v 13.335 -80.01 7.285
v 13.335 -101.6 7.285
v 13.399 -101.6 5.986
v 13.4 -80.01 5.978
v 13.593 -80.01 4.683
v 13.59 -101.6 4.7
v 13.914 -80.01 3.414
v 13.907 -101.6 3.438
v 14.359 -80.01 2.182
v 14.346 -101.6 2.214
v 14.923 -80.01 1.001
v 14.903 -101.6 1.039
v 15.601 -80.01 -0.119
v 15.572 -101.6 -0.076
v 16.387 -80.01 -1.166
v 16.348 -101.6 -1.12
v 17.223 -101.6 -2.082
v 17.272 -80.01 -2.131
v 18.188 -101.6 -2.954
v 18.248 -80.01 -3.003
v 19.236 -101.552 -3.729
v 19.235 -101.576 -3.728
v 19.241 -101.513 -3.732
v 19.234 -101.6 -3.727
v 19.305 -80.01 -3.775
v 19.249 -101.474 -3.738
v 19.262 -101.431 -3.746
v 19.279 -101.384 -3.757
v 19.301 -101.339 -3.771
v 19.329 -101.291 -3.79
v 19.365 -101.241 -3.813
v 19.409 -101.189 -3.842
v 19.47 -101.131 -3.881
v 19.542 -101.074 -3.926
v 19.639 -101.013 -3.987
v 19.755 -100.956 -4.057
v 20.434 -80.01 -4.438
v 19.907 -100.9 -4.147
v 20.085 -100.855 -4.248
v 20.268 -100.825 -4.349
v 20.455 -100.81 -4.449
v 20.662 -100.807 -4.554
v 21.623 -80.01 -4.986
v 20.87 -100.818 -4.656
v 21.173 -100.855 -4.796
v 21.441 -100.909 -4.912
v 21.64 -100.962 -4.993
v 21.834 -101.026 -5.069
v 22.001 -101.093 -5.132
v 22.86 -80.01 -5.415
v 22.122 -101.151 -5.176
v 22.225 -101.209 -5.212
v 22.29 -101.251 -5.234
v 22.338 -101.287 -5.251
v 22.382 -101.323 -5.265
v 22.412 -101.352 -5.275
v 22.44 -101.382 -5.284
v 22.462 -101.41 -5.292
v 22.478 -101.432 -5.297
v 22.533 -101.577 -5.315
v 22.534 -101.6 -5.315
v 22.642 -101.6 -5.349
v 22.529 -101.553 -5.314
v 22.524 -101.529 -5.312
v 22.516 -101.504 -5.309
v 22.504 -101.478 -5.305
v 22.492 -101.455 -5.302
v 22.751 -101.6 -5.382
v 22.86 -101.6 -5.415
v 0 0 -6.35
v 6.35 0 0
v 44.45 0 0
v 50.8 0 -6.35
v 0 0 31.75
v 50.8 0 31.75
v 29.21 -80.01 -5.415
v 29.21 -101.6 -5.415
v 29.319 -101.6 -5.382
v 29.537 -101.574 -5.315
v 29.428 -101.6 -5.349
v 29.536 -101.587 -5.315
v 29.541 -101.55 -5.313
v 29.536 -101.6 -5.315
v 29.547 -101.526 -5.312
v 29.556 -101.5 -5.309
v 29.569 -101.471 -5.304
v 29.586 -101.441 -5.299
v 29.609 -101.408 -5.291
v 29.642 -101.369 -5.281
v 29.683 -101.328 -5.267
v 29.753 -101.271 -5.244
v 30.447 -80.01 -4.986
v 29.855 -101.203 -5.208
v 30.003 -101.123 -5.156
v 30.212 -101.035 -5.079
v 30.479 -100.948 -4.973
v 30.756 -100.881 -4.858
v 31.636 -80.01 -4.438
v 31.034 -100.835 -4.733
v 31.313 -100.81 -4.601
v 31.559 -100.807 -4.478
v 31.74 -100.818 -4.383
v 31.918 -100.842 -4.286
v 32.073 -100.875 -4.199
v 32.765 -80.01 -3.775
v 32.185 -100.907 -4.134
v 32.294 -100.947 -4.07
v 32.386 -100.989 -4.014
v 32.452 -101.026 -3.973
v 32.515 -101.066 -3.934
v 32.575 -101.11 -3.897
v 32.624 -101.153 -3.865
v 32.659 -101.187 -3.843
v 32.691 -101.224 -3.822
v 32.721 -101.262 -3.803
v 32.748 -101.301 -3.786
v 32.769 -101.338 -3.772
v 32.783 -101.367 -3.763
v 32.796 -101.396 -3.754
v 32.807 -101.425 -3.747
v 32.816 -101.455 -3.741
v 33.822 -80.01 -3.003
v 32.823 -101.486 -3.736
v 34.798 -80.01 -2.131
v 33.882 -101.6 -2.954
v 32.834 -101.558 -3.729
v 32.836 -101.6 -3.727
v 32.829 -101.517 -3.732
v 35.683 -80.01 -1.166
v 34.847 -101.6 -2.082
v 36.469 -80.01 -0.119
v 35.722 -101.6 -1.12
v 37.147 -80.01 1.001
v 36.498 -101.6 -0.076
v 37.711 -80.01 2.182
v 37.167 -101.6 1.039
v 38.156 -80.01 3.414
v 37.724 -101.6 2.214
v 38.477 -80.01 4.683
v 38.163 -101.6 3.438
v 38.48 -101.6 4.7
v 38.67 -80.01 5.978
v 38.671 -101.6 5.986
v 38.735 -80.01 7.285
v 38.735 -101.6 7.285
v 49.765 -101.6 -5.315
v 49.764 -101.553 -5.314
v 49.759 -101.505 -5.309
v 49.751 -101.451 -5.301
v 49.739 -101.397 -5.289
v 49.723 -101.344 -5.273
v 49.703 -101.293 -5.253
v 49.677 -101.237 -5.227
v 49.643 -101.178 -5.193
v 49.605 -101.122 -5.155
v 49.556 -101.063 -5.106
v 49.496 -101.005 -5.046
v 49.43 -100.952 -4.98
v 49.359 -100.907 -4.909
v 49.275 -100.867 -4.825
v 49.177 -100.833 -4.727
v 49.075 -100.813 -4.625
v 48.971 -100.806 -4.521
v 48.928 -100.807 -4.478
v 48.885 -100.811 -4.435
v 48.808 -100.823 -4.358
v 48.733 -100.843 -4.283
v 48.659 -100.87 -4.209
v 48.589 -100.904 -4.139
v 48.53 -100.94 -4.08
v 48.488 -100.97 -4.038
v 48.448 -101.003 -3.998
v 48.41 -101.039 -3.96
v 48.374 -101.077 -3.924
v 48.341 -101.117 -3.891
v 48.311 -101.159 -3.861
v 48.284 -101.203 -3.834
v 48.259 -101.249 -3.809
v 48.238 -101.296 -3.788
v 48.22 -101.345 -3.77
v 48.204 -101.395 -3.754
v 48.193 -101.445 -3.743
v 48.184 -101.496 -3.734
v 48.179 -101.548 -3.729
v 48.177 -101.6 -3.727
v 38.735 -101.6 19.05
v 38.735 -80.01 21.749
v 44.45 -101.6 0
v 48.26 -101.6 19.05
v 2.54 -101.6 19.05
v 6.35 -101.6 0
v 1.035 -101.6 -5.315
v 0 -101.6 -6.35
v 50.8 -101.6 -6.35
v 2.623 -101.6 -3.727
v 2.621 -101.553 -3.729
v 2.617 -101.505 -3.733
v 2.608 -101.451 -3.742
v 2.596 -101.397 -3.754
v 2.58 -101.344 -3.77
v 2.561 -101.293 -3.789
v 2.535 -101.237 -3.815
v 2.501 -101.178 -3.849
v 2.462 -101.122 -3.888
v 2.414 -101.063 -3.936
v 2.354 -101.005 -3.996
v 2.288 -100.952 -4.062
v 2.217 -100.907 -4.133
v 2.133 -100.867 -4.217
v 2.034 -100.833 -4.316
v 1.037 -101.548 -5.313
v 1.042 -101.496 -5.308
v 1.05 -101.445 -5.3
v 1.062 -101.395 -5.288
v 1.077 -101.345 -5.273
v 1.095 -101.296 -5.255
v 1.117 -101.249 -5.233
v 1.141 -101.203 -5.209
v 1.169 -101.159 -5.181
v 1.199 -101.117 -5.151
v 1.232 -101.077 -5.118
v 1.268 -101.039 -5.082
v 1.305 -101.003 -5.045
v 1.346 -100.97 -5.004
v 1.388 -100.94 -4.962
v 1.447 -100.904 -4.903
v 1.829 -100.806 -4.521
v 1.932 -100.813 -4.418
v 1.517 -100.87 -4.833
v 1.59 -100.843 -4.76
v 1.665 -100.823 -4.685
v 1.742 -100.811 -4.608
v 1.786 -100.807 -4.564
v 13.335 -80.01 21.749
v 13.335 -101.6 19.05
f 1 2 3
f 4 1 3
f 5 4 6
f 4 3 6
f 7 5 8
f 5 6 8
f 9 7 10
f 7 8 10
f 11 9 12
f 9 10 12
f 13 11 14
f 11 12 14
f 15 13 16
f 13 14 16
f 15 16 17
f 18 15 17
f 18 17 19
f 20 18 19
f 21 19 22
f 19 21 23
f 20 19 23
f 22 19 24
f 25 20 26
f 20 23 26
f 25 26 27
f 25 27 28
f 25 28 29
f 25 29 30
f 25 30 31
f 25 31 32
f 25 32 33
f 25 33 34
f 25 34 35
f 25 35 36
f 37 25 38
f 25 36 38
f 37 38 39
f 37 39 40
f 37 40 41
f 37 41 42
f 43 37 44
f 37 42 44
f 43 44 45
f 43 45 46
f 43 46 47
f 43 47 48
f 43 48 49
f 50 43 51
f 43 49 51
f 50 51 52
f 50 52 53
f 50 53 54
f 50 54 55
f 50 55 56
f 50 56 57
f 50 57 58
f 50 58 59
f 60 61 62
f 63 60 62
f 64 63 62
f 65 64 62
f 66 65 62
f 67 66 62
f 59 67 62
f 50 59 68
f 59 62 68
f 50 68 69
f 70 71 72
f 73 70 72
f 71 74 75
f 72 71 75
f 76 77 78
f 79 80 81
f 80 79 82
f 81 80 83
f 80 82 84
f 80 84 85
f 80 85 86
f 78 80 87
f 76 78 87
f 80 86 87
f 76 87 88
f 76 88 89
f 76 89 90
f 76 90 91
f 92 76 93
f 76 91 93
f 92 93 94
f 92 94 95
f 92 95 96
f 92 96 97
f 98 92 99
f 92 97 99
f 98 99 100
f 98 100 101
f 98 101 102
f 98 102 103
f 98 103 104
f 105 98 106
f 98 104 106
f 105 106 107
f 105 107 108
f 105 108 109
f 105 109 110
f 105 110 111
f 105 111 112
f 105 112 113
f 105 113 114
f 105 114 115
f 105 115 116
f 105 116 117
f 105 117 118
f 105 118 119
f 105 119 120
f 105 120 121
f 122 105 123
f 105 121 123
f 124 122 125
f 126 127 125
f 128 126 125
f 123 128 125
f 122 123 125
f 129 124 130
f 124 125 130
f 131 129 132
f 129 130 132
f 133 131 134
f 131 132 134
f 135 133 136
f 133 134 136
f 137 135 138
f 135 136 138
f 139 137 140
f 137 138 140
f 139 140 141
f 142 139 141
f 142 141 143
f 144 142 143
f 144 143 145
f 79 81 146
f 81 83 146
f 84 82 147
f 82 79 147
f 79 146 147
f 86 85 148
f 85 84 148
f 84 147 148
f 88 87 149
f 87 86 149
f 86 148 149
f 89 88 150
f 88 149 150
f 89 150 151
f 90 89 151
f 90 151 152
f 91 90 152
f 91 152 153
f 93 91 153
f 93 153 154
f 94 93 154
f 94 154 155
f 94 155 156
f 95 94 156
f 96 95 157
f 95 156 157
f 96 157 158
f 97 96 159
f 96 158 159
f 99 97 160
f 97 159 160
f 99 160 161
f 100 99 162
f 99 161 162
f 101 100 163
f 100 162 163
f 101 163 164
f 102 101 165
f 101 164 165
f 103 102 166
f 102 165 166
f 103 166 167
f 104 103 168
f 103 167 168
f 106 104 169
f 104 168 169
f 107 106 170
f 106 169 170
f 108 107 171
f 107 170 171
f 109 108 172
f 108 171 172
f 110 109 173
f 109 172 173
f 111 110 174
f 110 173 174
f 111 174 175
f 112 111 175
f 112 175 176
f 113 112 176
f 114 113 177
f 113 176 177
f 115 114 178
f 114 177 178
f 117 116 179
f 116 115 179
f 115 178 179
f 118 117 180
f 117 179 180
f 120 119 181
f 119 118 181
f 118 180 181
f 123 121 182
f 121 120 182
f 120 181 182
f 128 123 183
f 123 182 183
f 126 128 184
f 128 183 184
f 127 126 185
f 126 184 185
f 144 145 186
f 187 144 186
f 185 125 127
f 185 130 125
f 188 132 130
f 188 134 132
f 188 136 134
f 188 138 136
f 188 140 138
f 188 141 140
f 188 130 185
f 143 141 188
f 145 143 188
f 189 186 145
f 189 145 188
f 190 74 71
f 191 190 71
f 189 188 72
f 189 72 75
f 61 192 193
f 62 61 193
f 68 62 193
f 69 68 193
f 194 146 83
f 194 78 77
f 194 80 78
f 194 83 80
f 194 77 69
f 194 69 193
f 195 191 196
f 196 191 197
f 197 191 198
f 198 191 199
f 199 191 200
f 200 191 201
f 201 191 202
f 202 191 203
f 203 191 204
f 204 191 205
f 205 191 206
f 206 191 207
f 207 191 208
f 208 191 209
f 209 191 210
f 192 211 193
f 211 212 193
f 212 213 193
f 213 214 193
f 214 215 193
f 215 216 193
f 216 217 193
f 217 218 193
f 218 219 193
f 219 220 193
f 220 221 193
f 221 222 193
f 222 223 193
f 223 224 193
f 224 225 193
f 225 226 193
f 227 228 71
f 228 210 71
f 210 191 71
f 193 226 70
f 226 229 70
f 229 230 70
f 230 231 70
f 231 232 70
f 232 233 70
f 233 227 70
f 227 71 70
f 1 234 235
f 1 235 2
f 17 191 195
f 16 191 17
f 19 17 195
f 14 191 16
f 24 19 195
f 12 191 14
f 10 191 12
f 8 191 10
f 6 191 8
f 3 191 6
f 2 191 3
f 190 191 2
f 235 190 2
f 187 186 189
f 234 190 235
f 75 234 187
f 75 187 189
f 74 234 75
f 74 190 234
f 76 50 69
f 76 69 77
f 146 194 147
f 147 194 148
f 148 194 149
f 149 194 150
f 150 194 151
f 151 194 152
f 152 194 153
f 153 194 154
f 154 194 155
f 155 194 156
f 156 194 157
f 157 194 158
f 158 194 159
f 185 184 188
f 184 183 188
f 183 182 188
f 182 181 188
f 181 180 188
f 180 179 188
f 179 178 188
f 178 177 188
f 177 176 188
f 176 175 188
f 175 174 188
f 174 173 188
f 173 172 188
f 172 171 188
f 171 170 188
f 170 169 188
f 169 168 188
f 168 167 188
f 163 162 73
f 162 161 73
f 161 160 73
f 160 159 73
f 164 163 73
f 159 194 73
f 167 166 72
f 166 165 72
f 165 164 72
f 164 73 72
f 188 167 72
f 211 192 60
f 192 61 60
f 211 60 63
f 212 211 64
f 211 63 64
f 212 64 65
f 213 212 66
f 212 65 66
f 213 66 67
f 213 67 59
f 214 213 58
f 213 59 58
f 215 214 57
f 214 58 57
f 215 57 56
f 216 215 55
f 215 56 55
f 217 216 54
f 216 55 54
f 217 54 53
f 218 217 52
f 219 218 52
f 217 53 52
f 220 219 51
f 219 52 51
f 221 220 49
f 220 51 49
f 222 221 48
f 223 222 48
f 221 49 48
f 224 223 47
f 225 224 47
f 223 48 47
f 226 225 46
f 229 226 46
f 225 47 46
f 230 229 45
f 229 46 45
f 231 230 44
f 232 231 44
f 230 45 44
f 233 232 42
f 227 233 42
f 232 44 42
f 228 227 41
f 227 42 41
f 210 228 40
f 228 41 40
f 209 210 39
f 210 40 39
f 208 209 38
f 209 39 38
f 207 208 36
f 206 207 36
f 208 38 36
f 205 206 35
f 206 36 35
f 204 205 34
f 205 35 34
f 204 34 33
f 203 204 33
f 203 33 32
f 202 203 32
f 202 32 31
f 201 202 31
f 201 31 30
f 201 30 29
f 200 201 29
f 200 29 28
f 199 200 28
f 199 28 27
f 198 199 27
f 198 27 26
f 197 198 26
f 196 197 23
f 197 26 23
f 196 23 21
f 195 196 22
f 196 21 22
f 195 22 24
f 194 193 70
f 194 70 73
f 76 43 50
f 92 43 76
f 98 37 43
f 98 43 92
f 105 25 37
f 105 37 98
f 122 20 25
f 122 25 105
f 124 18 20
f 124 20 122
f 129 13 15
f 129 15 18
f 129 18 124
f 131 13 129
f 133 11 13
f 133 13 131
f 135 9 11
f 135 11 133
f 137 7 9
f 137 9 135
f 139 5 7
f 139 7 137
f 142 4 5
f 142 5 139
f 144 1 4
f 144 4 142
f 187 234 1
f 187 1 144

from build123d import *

# Parameters (mm, degrees)
F1_DEPTH = 101.6
F3_DEPTH = 50.8
F4_W     = 25.4
F4_H     = 7.2853491507
F5_DEPTH = 21.59
F7_R     = 0.79375
F8_DEPTH = 25.4


# Not quite as in the source:
# - a feature names something its author has since deleted; it is built from what else it names


with BuildPart() as f1:
    # F0 (on Front) → F1 (new body)
    with BuildSketch(Plane.XZ):
        Polygon((50.8, 31.75), (0, 31.75), (6.35, 0), (44.45, 0), align=None)
        Polygon((44.45, 0), (6.35, 0), (0, -6.35), (50.8, -6.35), align=None)
    extrude(amount=F1_DEPTH)

    # F2 (on Right) → F3 (cut)
    with BuildSketch(Plane.YZ):
        Polygon((-101.6, 31.75), (-101.6, 19.05), (0, 31.75), align=None)
    extrude(amount=F3_DEPTH, mode=Mode.SUBTRACT)

    # F4 (on face) → F5 (cut)
    with BuildSketch(Plane.XZ.offset(101.6)):
        with Locations((26.035, 22.6926745754)):
            Rectangle(F4_W, F4_H)
        with BuildLine():
            Line((13.335, 19.05), (13.335, 7.2853491507))
            ThreePointArc((13.335, 7.2853491507), (15.9808333333, -0.6521508493), (22.86, -5.4146508493))
            Line((22.86, -5.4146508493), (29.21, -5.4146508493))
            ThreePointArc((29.21, -5.4146508493), (36.0891666667, -0.6521508493), (38.735, 7.2853491507))
            Line((38.735, 7.2853491507), (38.735, 19.05))
            Line((38.735, 19.05), (13.335, 19.05))
        make_face()
    extrude(amount=-F5_DEPTH, mode=Mode.SUBTRACT)

    # F7 (on offset) → F8 (cut, symmetric)
    with BuildSketch(Plane.YZ.offset(26.035)):
        with Locations((-101.6, -4.5212)):
            Circle(F7_R)
    extrude(amount=F8_DEPTH, both=True, mode=Mode.SUBTRACT)


solid = f1.part
